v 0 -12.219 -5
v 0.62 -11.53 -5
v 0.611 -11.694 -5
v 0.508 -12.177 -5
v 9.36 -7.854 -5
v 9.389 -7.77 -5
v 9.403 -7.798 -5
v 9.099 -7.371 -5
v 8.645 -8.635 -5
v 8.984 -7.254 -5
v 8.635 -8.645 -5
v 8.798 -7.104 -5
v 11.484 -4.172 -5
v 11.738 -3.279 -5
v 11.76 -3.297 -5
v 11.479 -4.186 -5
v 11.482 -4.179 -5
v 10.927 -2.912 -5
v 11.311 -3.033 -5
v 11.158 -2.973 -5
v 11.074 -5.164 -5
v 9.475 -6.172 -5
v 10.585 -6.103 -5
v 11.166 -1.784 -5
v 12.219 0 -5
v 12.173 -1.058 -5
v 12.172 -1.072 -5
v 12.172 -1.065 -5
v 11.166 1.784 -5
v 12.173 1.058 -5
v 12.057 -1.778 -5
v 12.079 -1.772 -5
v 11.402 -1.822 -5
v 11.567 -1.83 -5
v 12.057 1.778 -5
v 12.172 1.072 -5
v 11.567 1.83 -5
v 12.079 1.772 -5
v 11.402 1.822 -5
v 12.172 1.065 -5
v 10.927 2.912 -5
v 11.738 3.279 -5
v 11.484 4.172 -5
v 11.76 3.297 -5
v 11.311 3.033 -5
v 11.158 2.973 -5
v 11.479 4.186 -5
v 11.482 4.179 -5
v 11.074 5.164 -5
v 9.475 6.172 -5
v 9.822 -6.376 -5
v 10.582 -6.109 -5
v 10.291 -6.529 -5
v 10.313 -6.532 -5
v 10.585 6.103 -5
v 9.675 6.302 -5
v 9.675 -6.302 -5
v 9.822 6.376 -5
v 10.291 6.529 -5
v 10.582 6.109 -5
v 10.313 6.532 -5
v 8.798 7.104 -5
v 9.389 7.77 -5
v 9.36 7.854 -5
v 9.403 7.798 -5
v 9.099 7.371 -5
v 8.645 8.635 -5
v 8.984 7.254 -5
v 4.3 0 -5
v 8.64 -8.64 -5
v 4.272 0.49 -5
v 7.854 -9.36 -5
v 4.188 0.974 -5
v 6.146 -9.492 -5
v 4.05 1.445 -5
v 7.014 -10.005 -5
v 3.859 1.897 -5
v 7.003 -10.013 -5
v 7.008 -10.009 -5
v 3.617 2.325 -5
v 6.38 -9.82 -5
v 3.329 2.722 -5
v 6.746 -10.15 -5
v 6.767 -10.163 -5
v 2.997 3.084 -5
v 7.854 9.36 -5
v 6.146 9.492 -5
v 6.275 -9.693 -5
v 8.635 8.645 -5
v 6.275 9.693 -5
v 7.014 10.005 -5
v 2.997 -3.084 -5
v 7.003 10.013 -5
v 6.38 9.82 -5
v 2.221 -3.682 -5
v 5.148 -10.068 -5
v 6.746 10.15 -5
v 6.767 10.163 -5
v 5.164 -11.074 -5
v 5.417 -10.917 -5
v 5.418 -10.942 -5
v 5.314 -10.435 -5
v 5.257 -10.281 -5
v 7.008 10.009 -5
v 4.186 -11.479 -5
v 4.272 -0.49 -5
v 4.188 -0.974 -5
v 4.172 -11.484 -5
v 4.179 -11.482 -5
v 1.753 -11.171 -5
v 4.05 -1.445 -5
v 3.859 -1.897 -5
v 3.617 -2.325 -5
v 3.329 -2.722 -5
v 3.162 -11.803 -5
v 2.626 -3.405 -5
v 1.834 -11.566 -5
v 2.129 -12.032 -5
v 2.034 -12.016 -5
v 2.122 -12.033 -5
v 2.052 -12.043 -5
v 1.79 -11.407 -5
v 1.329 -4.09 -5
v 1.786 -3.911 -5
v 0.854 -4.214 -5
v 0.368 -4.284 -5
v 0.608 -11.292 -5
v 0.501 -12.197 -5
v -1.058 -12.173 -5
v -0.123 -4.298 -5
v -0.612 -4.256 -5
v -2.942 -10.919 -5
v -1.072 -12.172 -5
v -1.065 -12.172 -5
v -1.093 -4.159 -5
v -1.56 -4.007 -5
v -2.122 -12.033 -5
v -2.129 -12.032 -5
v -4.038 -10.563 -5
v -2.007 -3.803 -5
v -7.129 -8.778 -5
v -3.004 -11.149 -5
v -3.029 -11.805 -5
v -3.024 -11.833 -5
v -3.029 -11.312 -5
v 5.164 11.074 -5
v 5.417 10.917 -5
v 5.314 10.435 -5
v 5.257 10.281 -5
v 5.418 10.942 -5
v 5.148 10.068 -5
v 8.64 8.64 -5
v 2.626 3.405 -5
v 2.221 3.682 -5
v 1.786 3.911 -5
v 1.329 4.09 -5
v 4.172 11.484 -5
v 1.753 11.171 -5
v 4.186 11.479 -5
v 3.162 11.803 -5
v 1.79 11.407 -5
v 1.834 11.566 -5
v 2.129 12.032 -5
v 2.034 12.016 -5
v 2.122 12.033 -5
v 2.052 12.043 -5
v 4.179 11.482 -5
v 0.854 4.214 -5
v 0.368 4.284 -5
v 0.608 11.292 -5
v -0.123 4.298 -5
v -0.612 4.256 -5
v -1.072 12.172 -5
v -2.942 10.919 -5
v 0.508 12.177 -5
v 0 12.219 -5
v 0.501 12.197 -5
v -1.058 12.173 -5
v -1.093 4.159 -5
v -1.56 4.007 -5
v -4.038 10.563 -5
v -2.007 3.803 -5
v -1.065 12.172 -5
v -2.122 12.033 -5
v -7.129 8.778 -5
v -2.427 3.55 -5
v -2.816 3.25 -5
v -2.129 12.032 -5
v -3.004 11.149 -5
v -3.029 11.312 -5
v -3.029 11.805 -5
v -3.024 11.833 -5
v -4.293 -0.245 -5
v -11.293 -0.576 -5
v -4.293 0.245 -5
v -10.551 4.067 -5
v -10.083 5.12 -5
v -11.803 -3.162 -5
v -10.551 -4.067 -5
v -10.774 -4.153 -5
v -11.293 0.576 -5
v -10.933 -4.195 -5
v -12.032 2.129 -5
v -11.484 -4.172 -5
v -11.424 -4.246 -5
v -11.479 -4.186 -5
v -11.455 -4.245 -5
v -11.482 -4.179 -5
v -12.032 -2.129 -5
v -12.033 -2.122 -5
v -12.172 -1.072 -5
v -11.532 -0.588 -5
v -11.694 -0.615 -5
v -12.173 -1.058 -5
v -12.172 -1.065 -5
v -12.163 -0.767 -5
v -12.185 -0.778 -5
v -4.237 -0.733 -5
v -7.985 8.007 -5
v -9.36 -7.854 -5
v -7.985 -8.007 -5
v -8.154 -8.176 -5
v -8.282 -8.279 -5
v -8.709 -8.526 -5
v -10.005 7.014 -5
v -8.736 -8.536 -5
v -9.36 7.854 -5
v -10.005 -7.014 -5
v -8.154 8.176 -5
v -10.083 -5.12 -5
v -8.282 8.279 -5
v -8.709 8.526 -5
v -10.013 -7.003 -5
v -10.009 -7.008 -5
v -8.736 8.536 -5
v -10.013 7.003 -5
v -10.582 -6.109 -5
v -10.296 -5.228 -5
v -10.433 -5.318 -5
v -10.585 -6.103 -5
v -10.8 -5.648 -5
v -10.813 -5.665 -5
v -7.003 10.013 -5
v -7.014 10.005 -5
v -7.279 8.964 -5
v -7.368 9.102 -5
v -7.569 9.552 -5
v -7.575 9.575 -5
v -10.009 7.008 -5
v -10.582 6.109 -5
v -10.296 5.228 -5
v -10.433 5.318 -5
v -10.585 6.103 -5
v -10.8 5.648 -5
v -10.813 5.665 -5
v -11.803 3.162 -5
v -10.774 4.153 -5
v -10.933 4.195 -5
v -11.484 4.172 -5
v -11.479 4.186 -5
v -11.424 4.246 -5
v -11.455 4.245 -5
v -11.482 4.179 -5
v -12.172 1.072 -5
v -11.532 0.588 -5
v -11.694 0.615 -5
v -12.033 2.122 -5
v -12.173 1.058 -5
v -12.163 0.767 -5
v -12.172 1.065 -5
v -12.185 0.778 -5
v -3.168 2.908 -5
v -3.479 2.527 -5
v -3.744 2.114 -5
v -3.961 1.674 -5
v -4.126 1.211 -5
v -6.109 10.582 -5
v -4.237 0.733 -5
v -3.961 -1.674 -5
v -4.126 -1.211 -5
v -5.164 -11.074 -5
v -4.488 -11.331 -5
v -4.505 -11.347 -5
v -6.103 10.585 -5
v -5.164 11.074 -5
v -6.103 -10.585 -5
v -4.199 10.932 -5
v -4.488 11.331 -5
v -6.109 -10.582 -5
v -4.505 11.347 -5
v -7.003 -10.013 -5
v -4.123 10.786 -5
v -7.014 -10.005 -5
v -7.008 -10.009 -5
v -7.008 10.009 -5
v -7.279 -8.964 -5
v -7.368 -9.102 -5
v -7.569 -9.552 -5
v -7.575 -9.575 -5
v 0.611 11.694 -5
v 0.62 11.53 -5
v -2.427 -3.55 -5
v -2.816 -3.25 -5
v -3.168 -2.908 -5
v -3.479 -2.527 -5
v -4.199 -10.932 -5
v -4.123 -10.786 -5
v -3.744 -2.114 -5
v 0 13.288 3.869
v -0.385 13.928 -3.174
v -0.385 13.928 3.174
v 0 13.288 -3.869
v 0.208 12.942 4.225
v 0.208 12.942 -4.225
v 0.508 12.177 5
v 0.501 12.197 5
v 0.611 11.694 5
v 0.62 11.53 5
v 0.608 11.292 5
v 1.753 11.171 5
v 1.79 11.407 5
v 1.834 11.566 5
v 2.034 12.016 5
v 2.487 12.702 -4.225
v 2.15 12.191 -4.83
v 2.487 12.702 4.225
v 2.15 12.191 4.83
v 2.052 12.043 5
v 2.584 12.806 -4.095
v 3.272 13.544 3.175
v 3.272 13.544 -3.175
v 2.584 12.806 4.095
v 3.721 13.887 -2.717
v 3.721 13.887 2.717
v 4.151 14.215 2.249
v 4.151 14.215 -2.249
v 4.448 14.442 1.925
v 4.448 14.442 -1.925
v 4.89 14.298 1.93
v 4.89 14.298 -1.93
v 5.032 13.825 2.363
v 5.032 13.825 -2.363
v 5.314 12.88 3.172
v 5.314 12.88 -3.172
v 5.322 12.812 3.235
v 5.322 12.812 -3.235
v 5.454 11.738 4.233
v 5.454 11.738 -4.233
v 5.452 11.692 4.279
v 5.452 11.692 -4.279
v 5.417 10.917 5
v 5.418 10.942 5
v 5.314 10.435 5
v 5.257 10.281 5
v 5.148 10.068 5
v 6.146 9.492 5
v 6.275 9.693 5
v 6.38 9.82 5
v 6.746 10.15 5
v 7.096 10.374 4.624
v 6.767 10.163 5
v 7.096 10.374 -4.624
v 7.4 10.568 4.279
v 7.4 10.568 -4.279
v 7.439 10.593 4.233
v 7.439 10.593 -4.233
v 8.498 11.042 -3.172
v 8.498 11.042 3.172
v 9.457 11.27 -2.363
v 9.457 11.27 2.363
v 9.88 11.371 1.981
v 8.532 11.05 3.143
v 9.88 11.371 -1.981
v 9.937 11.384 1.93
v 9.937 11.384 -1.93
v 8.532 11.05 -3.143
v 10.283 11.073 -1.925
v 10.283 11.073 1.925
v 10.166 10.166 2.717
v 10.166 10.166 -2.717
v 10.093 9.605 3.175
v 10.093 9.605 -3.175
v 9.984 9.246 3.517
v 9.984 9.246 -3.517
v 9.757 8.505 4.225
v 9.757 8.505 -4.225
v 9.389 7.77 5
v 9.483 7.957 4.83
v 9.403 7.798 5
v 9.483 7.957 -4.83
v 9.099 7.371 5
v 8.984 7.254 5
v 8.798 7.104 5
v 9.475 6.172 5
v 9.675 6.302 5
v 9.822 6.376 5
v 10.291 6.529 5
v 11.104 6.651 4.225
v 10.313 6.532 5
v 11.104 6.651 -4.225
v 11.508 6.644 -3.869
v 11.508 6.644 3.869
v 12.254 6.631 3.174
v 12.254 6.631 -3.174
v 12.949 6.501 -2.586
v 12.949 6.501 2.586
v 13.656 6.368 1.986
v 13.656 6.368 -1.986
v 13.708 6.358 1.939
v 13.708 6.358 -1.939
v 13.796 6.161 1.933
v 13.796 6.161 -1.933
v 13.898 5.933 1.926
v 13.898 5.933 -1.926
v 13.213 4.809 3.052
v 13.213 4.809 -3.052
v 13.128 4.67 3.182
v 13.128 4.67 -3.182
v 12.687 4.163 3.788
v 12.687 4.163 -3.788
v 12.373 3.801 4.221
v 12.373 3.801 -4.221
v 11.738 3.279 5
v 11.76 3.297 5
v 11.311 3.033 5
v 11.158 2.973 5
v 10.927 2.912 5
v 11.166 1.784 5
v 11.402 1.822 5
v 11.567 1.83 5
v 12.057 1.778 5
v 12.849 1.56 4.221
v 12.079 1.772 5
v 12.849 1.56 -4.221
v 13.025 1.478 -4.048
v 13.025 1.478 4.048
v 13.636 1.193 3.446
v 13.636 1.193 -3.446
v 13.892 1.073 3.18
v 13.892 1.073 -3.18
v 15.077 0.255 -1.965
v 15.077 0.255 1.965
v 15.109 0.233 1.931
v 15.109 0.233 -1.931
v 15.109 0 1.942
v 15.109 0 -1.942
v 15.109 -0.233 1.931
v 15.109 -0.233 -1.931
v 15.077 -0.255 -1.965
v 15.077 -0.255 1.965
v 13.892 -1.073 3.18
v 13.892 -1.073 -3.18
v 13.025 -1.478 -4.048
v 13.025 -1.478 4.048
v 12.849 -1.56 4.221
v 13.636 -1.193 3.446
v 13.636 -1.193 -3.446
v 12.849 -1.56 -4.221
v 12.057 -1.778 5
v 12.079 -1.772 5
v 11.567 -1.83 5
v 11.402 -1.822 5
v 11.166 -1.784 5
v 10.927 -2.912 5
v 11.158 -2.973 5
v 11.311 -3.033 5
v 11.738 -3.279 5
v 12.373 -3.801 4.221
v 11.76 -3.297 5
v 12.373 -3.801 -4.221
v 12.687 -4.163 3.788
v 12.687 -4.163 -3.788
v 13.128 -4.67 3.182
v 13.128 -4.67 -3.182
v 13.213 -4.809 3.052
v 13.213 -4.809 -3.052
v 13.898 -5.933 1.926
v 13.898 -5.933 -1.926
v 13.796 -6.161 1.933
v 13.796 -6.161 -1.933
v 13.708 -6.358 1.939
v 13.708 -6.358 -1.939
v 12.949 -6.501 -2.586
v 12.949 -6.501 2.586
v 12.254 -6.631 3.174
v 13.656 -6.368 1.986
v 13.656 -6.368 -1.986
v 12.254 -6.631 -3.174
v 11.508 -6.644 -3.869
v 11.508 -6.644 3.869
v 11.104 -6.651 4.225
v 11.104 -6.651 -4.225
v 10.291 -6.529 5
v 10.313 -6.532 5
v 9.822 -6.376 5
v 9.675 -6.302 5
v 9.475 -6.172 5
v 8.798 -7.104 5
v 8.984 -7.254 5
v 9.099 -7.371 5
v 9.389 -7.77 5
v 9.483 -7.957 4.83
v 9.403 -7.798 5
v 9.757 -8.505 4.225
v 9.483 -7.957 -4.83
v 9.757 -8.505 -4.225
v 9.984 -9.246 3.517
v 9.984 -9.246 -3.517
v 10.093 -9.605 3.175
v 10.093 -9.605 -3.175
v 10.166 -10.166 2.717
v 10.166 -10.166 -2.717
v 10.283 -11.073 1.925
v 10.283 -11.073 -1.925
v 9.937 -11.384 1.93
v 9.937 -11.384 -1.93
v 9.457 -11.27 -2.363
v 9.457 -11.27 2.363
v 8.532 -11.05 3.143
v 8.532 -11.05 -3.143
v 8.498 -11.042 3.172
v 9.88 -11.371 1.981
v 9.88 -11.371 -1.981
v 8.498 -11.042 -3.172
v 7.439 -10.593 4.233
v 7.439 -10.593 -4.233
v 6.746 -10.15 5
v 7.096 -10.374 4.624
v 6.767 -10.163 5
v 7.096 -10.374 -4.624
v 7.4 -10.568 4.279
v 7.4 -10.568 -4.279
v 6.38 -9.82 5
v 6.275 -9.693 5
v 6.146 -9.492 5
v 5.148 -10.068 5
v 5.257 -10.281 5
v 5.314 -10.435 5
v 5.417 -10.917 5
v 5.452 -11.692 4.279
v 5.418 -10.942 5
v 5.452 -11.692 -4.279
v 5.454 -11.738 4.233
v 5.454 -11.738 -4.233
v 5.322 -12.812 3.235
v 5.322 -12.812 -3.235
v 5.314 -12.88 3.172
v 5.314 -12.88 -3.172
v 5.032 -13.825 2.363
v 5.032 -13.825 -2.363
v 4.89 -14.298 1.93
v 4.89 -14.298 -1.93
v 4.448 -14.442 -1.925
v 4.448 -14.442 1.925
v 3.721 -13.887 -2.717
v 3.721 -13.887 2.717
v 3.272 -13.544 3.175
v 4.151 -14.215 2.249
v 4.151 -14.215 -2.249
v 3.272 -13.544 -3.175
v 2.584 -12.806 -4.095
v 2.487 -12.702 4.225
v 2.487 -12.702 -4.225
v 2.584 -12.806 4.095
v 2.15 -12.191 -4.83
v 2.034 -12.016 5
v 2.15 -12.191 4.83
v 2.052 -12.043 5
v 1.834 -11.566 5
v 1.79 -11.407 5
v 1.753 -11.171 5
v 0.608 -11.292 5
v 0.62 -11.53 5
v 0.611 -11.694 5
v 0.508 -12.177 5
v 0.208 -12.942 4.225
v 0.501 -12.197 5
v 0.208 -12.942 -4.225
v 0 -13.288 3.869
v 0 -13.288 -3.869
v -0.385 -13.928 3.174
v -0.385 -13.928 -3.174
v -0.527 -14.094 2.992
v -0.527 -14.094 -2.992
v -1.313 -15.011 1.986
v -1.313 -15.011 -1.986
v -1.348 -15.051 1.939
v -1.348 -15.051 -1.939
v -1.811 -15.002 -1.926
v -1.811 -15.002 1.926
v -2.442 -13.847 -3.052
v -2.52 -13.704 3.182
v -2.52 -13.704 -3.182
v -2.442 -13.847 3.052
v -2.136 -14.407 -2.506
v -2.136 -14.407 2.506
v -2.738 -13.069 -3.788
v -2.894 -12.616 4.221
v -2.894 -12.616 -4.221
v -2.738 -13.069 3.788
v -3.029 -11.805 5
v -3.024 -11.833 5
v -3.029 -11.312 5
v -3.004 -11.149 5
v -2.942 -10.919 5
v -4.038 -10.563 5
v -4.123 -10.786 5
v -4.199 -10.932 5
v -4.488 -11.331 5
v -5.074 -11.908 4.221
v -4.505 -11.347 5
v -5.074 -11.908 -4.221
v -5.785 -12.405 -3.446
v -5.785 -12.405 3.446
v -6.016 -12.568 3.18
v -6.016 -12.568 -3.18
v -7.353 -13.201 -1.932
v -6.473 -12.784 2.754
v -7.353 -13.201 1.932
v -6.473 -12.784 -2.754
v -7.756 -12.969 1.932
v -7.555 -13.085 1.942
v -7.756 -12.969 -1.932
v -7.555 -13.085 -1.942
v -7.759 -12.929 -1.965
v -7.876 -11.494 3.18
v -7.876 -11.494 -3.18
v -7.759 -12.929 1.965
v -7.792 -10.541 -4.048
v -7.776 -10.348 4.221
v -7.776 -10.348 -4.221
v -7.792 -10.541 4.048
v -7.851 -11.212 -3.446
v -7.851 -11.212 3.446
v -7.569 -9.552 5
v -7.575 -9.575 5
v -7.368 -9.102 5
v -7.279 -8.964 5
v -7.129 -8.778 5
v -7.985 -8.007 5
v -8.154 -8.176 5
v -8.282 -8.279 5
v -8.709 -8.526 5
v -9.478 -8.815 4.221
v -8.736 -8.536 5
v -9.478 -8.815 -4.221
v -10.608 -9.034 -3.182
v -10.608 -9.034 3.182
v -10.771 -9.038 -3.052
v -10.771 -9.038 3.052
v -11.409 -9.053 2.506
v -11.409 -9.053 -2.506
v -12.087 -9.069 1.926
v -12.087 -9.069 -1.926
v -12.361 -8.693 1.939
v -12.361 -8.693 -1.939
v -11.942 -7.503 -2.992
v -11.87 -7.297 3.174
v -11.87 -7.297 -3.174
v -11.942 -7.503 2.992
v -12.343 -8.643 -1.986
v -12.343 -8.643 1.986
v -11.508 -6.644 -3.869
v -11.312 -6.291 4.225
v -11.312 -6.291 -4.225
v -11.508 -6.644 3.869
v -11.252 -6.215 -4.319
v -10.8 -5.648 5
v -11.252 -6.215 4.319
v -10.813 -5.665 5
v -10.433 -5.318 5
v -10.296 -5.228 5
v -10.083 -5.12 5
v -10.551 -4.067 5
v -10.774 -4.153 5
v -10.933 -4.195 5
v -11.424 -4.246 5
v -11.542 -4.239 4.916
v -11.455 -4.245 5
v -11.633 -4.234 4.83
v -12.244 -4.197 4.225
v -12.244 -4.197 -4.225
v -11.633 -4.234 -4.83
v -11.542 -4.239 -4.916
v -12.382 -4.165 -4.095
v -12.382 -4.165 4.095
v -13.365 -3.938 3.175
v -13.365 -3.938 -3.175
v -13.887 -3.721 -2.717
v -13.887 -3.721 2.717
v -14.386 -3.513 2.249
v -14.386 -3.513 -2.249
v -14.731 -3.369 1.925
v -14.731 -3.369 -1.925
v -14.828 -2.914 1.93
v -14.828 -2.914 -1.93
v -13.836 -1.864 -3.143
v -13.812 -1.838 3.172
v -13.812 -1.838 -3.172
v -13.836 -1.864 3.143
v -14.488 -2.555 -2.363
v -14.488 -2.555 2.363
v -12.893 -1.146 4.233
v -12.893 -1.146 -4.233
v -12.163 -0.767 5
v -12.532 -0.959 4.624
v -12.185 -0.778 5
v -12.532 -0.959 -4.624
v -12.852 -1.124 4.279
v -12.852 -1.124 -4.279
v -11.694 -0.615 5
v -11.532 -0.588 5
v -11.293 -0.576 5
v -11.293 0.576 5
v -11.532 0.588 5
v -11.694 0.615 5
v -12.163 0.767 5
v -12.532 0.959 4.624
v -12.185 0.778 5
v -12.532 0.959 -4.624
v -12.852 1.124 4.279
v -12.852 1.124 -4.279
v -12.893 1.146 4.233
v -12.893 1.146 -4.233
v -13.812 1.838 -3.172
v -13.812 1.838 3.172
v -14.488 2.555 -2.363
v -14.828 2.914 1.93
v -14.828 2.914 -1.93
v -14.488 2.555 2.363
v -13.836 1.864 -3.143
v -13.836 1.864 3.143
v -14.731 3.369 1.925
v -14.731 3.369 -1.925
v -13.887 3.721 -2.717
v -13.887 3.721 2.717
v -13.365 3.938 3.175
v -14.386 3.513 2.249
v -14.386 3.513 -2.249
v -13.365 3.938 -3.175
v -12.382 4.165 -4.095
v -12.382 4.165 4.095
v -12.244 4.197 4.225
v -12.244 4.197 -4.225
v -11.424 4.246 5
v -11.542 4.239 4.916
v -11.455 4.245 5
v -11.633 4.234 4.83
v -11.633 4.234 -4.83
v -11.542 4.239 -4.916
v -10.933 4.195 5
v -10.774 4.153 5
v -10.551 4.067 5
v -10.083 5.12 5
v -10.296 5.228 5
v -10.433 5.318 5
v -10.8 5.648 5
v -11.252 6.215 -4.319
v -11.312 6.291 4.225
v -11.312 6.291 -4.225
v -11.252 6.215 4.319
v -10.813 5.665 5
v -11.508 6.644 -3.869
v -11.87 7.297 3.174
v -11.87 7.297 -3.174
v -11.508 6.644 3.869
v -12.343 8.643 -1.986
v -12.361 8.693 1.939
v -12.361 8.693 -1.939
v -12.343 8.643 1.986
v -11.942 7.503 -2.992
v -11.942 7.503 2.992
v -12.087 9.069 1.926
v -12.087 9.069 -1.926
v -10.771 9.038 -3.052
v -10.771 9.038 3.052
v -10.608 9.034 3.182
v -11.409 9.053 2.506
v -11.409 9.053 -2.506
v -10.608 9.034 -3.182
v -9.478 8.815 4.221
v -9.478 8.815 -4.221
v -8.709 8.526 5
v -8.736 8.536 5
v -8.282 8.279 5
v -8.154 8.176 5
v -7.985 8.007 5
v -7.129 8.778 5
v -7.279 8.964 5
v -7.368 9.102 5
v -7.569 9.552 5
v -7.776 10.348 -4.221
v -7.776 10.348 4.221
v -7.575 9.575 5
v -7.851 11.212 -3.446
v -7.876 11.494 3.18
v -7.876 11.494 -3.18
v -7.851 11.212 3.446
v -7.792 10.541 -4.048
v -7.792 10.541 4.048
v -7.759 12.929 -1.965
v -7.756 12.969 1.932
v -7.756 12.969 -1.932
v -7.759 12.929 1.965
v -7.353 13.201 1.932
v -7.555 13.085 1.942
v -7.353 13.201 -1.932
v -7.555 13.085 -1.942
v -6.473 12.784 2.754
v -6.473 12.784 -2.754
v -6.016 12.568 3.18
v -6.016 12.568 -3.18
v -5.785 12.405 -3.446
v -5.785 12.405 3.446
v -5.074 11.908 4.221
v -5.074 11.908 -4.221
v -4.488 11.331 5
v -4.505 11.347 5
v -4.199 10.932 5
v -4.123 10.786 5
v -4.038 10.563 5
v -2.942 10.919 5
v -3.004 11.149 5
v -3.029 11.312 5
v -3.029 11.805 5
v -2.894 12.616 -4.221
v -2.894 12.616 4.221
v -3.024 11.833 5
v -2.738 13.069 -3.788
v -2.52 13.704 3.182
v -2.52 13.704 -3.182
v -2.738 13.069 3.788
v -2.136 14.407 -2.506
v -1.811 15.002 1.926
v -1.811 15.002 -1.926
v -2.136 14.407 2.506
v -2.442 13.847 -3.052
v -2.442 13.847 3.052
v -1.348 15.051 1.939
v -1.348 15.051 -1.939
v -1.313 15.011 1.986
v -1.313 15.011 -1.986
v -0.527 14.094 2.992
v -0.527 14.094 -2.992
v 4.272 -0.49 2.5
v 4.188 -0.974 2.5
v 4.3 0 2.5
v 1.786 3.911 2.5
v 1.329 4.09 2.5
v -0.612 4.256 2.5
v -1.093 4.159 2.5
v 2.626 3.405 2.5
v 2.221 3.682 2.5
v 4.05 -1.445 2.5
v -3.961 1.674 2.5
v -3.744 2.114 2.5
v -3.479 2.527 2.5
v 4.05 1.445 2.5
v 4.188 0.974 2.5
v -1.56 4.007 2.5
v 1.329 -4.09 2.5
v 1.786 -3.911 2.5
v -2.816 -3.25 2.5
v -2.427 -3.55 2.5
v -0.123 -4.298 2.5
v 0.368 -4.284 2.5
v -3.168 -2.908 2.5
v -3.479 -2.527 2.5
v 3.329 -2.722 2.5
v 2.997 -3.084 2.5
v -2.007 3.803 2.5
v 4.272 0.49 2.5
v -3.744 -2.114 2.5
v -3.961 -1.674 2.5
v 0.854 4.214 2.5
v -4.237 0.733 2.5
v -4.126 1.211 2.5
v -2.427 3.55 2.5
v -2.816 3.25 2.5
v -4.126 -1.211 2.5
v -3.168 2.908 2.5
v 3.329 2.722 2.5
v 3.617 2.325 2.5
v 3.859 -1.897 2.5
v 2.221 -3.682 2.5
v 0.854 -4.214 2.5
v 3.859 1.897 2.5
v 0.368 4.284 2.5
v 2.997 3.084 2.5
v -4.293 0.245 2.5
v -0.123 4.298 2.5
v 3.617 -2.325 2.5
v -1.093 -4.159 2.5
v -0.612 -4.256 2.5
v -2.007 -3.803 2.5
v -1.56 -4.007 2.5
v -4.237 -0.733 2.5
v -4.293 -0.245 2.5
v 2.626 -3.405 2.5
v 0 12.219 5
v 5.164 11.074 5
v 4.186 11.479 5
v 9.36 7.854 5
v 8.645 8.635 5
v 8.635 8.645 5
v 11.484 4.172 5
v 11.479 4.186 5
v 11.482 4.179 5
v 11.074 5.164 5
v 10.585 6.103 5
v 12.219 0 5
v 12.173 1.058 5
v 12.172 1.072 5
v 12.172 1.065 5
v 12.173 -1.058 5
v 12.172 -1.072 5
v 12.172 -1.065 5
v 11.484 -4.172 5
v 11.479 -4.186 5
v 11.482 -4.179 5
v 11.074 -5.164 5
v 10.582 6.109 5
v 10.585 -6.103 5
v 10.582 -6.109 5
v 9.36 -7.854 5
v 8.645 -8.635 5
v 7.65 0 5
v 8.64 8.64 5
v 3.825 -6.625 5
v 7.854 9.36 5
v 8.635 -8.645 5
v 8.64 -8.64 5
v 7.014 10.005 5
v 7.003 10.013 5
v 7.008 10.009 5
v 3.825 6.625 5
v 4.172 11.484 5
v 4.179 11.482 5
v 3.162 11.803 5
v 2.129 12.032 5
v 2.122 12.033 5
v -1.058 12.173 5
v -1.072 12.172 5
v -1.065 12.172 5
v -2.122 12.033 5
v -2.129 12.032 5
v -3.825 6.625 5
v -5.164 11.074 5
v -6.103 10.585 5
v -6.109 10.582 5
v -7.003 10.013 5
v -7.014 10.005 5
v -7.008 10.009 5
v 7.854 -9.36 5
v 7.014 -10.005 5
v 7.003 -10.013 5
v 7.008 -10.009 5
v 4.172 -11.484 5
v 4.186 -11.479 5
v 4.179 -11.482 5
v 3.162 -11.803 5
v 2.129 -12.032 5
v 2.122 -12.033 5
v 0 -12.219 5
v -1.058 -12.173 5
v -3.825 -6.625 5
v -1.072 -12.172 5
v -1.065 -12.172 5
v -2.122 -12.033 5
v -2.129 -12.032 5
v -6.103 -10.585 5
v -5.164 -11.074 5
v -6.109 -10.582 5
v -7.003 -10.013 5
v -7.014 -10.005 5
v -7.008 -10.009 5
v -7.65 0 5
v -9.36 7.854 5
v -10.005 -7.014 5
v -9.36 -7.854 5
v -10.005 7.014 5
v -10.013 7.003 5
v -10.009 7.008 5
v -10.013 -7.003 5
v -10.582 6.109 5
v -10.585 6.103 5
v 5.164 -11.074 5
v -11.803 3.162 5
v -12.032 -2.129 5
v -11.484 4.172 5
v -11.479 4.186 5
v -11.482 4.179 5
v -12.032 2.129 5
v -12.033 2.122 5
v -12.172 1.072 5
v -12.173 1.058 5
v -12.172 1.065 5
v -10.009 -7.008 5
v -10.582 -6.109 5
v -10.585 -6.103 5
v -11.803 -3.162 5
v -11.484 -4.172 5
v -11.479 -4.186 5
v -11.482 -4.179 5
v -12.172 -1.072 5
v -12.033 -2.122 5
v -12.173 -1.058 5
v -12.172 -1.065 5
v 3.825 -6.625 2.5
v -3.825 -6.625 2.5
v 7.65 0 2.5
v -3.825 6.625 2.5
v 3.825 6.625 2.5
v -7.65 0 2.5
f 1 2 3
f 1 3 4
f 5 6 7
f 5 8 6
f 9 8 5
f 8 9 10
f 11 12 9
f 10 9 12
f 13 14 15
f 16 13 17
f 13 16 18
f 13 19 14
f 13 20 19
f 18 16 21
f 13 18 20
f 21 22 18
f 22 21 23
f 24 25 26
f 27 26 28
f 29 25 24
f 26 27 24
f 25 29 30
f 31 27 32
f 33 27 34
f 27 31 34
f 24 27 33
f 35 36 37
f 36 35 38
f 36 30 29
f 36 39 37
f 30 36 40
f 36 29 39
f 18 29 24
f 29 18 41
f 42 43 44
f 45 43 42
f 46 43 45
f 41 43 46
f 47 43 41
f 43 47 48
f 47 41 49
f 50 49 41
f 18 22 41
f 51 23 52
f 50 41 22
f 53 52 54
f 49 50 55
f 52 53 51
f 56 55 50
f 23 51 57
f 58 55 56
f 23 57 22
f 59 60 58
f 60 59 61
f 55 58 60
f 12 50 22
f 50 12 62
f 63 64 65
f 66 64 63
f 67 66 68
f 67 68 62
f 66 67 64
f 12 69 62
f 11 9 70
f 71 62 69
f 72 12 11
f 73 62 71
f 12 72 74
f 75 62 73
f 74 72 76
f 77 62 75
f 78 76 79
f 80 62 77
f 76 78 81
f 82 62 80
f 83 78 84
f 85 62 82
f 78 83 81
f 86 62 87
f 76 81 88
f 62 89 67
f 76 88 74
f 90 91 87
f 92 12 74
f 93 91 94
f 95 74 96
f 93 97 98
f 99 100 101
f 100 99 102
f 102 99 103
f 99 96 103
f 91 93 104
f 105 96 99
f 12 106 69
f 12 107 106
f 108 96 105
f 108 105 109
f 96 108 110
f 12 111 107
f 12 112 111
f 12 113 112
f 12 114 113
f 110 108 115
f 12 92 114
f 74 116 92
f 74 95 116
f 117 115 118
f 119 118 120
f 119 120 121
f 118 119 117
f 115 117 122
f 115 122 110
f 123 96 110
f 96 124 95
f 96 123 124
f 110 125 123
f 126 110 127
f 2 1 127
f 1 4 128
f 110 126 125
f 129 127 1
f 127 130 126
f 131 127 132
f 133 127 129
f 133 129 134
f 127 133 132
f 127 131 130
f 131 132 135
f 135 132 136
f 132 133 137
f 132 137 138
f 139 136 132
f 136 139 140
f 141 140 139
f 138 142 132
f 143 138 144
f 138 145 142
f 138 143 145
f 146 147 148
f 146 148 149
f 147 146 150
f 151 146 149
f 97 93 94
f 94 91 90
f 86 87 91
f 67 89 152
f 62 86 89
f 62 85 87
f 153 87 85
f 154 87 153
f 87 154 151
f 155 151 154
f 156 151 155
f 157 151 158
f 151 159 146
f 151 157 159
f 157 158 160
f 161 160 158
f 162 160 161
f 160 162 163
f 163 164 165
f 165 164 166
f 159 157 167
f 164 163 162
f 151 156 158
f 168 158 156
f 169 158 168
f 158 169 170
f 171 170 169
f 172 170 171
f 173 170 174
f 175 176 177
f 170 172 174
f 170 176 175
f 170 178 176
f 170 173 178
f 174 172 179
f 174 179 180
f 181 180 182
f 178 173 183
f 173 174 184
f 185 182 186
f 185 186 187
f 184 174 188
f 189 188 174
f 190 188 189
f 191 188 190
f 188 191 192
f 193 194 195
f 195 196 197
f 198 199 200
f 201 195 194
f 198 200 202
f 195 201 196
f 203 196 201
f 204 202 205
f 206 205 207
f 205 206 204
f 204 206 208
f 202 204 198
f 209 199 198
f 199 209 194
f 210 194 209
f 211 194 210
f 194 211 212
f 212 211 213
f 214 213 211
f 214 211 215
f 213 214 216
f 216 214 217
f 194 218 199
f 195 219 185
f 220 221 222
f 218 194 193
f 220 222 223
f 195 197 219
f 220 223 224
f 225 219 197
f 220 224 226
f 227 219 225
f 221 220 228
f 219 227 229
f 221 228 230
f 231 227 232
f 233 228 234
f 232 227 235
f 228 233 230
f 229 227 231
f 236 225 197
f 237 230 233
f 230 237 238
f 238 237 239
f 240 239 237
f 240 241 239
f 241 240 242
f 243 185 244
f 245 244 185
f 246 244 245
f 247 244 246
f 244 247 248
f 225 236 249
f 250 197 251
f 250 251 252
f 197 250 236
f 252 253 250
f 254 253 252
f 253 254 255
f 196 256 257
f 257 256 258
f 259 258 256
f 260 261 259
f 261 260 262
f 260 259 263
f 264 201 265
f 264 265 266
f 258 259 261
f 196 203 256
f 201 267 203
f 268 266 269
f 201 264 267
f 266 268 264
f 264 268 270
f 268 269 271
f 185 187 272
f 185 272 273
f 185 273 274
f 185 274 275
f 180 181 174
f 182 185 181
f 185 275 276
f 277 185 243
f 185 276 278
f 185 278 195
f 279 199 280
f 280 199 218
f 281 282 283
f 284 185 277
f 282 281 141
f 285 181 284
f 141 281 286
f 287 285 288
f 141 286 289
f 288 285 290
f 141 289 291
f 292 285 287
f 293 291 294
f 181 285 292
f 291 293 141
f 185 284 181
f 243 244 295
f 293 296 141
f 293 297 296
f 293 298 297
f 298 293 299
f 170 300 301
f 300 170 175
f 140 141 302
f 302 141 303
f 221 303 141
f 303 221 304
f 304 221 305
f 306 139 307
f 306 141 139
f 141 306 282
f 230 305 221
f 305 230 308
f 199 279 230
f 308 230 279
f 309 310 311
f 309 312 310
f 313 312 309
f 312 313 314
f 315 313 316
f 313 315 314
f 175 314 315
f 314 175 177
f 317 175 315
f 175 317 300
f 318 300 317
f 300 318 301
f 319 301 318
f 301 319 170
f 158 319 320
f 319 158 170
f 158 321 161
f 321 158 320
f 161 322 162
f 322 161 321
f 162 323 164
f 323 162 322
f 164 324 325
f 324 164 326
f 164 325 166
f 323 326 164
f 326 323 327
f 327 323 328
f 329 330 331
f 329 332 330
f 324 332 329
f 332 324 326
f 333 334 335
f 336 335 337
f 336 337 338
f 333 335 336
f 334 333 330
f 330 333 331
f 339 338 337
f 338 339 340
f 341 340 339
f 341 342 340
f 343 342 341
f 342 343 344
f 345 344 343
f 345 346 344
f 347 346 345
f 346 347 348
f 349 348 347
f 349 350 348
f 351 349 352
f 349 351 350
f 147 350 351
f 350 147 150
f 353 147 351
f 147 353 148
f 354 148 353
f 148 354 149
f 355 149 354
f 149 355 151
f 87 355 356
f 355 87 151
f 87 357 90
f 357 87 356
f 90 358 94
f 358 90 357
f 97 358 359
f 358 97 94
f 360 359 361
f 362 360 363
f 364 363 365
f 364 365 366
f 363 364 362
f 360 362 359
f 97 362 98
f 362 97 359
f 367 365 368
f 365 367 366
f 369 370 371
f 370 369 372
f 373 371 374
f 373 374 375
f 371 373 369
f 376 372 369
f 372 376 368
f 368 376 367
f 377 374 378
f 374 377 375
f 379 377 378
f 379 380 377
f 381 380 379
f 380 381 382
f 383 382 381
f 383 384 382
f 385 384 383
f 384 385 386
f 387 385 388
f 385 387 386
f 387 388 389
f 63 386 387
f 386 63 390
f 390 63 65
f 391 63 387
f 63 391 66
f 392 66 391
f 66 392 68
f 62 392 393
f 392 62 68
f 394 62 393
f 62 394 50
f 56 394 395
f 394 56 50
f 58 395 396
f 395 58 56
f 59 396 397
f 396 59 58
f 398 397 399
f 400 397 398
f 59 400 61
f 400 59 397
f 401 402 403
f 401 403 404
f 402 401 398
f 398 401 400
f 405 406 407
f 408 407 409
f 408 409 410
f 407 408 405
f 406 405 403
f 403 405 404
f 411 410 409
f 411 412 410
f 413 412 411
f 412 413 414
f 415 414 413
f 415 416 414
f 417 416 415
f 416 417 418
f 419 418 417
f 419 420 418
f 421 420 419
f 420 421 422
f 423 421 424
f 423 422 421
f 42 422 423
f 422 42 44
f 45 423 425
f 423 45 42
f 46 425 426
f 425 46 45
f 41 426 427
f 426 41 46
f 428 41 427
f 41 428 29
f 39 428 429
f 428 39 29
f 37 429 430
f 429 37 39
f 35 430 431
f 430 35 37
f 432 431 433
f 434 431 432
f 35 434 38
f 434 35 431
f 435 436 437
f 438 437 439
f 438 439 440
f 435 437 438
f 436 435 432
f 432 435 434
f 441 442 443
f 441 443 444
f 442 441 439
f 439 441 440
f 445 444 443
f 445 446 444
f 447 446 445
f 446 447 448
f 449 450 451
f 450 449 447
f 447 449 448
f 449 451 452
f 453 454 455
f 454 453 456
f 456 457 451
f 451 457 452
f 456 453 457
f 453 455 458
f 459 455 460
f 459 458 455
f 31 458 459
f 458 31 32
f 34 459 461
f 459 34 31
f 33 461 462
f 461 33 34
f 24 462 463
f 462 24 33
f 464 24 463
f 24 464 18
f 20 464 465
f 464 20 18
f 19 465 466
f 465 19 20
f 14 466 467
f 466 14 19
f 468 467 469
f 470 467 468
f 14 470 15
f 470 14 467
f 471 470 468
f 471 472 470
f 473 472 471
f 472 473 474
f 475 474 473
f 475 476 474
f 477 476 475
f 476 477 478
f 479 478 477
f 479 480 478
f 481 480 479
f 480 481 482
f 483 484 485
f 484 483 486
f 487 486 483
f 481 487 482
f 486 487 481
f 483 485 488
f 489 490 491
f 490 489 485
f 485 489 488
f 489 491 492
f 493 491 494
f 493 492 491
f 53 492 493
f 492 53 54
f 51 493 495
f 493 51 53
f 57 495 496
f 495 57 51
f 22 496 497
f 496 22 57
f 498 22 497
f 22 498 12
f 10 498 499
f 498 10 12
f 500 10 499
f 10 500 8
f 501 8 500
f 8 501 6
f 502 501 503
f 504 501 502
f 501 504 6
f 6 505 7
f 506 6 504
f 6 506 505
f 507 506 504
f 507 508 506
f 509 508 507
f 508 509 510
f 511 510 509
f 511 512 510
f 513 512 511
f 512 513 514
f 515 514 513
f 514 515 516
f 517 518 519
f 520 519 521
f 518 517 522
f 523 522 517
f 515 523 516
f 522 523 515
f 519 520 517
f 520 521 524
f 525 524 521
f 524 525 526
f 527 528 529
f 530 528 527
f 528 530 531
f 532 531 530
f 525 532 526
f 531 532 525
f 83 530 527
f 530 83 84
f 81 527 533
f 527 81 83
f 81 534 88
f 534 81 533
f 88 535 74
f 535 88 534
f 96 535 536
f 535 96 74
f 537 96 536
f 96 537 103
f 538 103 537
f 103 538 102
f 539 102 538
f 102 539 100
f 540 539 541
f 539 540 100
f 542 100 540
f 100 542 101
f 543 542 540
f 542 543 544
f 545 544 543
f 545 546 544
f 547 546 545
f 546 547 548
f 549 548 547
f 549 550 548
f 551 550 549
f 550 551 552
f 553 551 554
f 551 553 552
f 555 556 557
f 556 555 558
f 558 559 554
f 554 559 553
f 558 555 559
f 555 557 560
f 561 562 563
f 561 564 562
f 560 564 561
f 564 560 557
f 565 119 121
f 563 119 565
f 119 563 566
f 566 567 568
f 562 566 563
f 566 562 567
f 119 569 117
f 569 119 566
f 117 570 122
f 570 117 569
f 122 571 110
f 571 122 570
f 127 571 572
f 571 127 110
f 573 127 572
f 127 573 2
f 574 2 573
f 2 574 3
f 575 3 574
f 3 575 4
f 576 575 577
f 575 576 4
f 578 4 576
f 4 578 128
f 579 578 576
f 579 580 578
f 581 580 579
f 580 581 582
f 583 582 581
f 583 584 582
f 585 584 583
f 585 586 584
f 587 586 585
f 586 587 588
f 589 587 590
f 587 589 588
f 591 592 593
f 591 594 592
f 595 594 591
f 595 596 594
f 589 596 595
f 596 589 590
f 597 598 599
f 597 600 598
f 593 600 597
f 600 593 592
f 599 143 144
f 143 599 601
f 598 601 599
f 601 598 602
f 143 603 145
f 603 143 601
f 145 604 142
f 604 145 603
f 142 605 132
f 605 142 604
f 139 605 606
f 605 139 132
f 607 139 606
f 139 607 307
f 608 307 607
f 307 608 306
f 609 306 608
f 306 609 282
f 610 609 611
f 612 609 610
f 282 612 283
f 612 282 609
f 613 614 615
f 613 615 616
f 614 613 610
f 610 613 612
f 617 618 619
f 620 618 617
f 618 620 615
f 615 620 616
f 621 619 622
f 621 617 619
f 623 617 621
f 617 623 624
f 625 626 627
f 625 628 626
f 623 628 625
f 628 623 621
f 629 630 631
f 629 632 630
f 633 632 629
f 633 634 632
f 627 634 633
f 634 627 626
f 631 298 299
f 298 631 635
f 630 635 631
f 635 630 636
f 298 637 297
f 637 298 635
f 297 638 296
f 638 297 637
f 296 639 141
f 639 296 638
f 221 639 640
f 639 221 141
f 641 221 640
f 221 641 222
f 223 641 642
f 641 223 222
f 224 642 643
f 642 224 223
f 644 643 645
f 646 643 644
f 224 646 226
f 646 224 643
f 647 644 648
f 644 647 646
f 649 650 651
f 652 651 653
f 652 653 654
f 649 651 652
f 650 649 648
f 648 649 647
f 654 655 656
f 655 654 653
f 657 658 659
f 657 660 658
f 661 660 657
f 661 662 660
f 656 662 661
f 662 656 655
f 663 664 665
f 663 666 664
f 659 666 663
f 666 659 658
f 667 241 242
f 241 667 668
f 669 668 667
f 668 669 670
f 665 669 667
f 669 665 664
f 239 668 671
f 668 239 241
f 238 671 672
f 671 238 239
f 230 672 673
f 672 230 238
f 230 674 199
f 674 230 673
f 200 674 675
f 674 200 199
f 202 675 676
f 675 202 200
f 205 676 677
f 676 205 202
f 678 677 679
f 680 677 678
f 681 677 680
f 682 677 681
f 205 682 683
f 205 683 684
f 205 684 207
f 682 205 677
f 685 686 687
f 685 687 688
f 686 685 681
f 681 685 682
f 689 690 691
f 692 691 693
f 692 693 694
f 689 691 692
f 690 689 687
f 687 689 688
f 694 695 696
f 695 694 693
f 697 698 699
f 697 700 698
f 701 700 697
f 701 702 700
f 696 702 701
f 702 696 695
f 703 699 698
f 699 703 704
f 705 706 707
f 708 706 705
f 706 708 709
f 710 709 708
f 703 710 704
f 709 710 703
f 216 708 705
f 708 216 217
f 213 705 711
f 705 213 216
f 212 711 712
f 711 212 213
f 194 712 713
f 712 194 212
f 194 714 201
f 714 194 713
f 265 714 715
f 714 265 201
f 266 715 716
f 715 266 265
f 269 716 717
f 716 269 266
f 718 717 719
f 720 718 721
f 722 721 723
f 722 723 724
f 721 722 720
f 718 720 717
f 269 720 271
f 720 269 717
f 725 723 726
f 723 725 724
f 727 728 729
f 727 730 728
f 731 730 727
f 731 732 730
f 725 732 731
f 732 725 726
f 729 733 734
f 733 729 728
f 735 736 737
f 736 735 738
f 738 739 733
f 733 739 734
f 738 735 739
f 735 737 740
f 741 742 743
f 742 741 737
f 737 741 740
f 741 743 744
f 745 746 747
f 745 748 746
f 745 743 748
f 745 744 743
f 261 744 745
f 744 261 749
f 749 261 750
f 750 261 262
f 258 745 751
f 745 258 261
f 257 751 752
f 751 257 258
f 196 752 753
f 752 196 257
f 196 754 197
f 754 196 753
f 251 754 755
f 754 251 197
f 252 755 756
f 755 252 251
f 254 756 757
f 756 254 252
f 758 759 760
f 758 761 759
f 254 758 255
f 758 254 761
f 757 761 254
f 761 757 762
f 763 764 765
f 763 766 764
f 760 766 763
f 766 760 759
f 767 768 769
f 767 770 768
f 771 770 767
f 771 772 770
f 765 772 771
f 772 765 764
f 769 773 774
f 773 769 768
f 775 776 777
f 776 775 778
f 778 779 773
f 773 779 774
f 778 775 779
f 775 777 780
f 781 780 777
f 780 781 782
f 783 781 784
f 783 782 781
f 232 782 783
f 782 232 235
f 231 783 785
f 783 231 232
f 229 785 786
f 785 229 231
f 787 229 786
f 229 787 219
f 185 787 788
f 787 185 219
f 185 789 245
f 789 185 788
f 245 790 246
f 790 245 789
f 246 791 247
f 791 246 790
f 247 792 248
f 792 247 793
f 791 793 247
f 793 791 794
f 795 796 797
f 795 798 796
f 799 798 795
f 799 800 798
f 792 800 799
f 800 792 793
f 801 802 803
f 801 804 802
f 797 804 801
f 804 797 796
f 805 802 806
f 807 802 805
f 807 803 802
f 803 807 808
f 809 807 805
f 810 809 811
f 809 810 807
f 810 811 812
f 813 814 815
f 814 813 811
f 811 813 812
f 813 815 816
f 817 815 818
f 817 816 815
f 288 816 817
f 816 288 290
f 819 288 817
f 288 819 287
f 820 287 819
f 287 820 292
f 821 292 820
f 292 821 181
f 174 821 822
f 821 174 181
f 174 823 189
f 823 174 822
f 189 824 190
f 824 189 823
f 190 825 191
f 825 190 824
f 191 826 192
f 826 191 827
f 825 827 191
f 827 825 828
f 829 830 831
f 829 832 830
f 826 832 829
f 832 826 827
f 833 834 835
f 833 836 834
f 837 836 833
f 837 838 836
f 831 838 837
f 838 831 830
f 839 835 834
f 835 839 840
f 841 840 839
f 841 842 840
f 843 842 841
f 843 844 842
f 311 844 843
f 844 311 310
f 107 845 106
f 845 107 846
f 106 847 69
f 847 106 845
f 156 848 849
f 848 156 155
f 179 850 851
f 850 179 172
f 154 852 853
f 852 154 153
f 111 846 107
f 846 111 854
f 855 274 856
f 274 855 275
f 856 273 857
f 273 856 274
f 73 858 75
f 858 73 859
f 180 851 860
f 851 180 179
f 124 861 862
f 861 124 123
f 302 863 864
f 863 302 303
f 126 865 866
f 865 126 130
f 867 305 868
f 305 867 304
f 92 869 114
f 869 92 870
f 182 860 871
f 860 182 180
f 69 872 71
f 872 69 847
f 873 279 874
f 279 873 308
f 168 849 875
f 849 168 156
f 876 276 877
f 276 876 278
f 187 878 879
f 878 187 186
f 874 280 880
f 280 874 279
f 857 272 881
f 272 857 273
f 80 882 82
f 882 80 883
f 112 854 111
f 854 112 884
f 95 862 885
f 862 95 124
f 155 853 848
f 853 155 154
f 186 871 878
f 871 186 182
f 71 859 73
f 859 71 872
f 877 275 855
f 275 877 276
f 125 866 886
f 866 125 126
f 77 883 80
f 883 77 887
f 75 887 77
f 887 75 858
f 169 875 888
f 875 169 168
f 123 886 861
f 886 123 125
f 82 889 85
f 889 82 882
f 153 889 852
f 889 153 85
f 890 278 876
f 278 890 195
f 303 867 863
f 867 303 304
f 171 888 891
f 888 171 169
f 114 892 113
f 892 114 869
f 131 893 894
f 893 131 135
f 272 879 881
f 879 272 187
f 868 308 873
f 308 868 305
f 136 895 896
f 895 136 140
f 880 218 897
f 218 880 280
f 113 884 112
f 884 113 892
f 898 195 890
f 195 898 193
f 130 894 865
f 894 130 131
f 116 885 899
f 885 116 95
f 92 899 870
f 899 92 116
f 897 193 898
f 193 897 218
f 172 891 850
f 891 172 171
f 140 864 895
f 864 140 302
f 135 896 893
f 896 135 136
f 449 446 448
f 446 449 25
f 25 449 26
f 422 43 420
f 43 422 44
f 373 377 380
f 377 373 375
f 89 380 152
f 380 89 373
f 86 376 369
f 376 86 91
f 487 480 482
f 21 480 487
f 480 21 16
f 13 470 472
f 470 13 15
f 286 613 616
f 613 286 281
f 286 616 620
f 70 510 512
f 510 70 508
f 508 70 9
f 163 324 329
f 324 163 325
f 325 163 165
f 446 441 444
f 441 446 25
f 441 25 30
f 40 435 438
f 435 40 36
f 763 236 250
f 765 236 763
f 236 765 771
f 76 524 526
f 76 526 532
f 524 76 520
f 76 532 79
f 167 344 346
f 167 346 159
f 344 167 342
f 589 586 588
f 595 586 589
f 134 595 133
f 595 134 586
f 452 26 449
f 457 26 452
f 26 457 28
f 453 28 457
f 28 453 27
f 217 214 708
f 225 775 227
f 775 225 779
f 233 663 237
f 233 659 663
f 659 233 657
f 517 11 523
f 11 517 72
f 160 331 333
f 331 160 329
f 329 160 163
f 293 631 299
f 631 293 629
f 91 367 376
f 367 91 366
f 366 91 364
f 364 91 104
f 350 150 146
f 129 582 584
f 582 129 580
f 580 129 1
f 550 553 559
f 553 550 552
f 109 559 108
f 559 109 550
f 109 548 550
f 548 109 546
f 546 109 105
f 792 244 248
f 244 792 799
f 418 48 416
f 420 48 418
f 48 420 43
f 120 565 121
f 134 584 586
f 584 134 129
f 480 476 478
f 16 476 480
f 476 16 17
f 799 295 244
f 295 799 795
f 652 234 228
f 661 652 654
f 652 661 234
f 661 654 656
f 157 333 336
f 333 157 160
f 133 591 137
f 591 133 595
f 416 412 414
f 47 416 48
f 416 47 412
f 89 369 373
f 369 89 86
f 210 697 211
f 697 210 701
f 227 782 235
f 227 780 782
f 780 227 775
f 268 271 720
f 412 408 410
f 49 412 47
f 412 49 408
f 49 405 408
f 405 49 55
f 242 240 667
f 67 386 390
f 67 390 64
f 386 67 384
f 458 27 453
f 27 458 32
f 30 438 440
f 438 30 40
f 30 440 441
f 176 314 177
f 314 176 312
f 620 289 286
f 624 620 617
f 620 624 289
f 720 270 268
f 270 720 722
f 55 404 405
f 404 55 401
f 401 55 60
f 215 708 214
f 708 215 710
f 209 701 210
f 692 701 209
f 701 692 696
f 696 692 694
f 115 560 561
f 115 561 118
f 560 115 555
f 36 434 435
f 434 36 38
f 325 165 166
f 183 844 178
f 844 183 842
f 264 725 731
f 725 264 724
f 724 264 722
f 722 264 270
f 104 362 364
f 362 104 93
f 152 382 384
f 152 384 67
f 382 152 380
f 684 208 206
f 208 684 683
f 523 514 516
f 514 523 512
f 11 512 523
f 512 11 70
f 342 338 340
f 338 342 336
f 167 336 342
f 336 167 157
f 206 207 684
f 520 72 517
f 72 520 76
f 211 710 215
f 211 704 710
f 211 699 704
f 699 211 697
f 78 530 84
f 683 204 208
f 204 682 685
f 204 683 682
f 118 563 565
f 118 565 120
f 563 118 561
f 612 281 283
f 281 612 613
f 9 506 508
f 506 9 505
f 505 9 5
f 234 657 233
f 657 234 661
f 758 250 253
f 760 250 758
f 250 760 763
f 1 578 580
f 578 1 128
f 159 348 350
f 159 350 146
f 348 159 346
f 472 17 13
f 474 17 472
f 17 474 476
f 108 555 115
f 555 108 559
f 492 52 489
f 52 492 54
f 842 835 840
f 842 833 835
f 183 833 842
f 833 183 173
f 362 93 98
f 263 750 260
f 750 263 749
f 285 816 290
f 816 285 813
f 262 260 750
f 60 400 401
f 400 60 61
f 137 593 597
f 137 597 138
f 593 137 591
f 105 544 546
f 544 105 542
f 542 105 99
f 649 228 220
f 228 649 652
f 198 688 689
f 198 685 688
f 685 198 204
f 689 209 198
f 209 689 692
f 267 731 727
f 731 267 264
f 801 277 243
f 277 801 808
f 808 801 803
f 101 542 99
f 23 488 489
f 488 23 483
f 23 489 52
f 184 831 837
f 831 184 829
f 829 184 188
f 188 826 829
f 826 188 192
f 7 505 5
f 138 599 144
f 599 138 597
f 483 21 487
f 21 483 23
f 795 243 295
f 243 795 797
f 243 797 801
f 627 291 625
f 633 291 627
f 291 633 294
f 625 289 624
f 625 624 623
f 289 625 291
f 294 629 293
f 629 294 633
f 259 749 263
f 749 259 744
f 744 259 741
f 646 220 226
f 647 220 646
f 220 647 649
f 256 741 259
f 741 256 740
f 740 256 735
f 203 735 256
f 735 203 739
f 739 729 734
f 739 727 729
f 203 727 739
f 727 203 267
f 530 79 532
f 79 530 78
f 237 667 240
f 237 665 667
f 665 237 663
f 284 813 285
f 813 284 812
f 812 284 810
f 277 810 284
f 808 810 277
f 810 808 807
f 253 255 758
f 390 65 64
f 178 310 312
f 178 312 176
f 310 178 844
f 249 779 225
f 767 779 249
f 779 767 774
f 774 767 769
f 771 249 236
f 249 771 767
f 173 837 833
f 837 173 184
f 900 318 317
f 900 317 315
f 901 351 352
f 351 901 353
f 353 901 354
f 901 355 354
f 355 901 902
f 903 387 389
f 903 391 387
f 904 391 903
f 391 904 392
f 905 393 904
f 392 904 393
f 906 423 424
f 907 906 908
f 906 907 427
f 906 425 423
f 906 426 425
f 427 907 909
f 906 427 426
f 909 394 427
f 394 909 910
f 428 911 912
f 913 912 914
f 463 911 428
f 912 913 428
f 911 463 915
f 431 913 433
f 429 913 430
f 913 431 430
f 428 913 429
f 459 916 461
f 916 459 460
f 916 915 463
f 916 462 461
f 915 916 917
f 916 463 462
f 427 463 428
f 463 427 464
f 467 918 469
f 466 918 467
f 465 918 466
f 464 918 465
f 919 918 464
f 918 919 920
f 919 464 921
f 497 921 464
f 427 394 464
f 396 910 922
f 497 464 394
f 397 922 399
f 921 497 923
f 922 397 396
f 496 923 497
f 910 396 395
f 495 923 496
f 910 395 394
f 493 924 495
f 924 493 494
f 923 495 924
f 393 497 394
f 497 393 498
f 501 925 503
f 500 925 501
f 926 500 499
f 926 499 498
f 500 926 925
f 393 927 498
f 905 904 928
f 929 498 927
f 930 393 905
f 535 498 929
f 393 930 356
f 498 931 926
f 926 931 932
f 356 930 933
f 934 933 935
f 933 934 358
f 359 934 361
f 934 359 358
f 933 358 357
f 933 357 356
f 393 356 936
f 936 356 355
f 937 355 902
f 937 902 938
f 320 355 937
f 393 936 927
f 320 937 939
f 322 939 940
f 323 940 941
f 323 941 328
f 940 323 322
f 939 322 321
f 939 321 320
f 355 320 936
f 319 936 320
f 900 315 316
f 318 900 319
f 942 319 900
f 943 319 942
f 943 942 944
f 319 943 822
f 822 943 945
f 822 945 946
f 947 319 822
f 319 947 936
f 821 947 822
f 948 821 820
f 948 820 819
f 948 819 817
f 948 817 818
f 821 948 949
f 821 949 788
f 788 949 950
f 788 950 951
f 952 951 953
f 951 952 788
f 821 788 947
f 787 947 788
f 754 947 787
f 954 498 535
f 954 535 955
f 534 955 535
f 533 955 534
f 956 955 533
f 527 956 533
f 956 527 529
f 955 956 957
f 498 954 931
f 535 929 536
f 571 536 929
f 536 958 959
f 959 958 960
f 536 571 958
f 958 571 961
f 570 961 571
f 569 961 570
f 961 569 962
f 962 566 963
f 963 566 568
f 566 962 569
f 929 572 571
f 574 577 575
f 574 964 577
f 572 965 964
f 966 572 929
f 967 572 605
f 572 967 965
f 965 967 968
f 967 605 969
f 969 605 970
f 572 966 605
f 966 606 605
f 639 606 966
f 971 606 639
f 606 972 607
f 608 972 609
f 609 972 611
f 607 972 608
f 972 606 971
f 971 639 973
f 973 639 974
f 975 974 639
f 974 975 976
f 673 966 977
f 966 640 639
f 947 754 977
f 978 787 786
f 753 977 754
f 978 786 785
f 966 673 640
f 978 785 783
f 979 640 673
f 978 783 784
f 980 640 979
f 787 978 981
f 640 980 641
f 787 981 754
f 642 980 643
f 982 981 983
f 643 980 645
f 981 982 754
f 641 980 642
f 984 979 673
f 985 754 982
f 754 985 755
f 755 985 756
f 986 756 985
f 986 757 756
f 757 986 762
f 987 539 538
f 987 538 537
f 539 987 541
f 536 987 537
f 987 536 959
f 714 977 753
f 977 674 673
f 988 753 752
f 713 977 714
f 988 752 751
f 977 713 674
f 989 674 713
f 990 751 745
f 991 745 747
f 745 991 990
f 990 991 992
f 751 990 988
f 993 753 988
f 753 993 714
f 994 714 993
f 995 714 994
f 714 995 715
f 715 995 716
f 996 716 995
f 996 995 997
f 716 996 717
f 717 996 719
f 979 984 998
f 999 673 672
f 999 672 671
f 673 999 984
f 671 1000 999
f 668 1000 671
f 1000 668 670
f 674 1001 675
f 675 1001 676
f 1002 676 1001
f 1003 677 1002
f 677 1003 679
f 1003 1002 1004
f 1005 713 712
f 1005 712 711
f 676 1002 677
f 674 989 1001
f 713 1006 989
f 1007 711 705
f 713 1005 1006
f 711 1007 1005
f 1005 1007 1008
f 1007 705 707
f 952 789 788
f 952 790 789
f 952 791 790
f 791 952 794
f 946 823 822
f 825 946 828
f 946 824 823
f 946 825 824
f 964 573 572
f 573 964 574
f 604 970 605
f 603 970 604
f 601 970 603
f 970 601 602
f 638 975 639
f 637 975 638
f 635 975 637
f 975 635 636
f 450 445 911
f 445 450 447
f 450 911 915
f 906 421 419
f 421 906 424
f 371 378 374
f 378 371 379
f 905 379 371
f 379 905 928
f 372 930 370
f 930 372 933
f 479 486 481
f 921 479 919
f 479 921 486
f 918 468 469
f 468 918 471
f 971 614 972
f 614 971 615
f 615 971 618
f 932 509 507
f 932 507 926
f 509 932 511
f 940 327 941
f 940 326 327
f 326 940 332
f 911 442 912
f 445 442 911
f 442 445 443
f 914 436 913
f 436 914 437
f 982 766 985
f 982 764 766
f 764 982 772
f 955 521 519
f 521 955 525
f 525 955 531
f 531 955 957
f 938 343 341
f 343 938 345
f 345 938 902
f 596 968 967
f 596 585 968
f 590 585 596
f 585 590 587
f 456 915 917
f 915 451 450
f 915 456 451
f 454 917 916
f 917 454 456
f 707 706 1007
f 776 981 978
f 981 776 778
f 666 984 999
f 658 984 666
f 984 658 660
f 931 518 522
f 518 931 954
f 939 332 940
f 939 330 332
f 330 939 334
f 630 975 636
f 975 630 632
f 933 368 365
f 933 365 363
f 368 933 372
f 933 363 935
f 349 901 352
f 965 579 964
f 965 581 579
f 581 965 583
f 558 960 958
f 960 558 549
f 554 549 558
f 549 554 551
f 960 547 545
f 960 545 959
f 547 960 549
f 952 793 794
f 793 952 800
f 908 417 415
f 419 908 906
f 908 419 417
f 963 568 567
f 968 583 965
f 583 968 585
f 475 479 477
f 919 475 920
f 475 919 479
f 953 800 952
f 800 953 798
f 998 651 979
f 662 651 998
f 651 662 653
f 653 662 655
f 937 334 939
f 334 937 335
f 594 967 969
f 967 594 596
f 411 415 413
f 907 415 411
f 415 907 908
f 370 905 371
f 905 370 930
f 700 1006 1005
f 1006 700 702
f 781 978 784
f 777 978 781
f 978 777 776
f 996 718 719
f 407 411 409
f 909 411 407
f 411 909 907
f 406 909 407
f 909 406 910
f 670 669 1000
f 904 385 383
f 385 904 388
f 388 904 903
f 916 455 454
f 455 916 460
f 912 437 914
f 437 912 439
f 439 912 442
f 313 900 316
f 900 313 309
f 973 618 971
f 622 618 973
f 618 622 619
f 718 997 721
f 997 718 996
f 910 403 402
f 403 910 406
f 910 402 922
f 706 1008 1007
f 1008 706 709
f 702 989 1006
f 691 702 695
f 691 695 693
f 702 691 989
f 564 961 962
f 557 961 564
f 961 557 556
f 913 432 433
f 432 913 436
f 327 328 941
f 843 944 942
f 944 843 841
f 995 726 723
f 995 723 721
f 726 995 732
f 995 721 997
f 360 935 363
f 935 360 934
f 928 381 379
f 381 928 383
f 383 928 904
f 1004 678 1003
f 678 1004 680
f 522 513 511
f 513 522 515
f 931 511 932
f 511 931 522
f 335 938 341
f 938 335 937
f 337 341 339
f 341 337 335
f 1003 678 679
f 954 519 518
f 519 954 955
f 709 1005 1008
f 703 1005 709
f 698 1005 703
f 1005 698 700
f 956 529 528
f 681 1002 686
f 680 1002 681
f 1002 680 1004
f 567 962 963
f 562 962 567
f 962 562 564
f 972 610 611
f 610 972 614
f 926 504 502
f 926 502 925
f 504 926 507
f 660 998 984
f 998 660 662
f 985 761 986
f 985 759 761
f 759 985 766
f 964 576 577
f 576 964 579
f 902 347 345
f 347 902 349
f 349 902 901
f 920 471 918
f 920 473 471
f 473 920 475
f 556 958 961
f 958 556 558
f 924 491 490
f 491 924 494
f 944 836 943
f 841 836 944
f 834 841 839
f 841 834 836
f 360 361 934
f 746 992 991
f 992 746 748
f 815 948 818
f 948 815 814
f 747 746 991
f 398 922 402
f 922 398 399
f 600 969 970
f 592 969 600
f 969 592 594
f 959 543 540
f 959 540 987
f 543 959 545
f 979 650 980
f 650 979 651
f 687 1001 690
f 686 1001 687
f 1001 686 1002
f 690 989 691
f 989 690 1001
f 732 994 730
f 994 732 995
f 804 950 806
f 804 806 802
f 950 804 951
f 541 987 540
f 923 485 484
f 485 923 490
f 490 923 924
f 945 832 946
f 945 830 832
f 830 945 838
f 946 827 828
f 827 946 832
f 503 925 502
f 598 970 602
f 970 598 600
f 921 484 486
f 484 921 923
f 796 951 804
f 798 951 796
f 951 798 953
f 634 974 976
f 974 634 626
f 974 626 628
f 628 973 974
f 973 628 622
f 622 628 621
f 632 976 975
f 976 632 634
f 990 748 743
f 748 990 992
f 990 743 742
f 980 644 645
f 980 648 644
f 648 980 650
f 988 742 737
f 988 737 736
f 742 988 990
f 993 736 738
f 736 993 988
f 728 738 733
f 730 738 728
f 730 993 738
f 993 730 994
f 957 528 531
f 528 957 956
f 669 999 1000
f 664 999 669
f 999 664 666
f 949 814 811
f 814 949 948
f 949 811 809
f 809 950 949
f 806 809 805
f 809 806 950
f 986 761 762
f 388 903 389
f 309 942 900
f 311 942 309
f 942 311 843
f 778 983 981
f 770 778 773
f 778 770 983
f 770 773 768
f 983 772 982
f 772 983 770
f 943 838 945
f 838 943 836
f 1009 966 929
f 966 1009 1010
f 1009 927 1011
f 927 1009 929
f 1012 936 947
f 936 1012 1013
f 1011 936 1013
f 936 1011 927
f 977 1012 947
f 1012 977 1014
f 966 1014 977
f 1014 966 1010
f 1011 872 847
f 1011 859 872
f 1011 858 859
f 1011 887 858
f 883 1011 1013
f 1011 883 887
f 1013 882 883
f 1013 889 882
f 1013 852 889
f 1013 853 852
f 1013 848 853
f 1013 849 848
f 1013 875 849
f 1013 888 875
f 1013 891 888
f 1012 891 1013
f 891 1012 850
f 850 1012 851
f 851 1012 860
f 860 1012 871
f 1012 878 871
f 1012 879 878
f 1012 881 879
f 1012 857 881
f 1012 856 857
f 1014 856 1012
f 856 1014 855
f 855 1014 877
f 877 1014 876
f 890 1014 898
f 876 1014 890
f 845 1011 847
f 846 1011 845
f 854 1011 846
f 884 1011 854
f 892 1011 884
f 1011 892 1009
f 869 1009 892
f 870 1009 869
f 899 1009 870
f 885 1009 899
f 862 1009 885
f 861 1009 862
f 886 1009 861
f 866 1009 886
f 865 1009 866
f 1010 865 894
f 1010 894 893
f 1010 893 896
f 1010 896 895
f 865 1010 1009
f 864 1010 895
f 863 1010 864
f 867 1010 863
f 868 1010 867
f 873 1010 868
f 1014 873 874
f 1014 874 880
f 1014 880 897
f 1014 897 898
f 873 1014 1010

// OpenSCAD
/* Derived by Carlosgs from:
 * http://www.thingiverse.com/thing:12789
 * An extruder gear set for the TechZone Huxley,
 *	featuring Herringbone teeth.
 * You will have to recalibrate your E_STEPS_PER_MM in
 *	your firmware (ratio changing from original techzone
 *	lasercut gears).
 * This use 2 modules from the MCAD library that you can
 *	get from https://github.com/elmom/MCAD.
 * 
 * Part - the motor gear mount hub with set screw hole -
 *	derived from http://www.thingiverse.com/thing:3104
 *	(thanks GilesBathgate) which is under GPL CC license.
 *
 * Copyright (C) 2011	Guy 'DeuxVis' P.
 *
 * This program is free software; you can redistribute it and/or
 * modify it under the terms of the GNU General Public License
 * as published by the Free Software Foundation; either version 2
 * of the License, or (at your option) any later version.
 * 
 * This program is distributed in the hope that it will be useful,
 * but WITHOUT ANY WARRANTY; without even the implied warranty of
 * MERCHANTABILITY or FITNESS FOR A PARTICULAR PURPOSE.	See the
 * GNU General Public License for more details.

 * You should have received a copy of the GNU General Public License
 * along with this program; if not, write to the Free Software
 * Foundation, Inc., 51 Franklin Street, Fifth Floor, Boston, MA	02110-1301, USA.
 * -- 
 *		 DeuxVis - device@ymail.com */

include <MCAD/involute_gears.scad>

M8_nut_diameter = 15.3;
nut_separation = 5;

SmallGear_N_Teeth = 15;
M8_rod_diam = 8.6;

// Increase the resolution of default shapes
$fa = 5; // Minimum angle for fragments [degrees]
$fs = 0.5; // Minimum fragment size [mm]

/* Herringbone gear module, adapted from MCAD/involute_gears */
module herringbone_gear( teeth=12, circles=0, shaft=5 ) {
	twist=0;//100;
	height=10;
	pressure_angle=30;

	diam = teeth*2;
	
	truncation_length = 2.8;
	truncation_height = height/2.5;

	module myGear() {
		difference() {
			gear(
				number_of_teeth=teeth,
				circular_pitch=320,
				pressure_angle=pressure_angle,
				clearance = 0.2,
				gear_thickness = height/2,
				rim_thickness = height/2,
				rim_width = 1,
				hub_thickness = height/2,
				hub_diameter=1,
				bore_diameter=shaft,
				circles=circles,
				twist=twist/teeth
			);
			mirror([0,0,1]) translate([0,0,-height/2-0.01]) {
				difference() {
					cylinder(r=diam/2+1, h=truncation_height);
					translate([0,0,-0.01])
						cylinder(r1=diam/2-truncation_length, r2=diam/2+1, h=truncation_height+0.02);
				}
			}
		}
	}
	
	myGear();
	mirror( [0,0,1] )
		myGear();
}

module cyclone_rod_gear(with_extra_parts=false, exploded=false) {
// Extruder Gear
difference() {
	union() {
		//gear
		rotate([180,0,0]) herringbone_gear( teeth=SmallGear_N_Teeth, circles=0, shaft=M8_rod_diam);
	}

	translate( [0, 0, (nut_separation/2)] ) cylinder( r=M8_nut_diameter/2, h=7, $fn=6 );
}
}

cyclone_rod_gear();
